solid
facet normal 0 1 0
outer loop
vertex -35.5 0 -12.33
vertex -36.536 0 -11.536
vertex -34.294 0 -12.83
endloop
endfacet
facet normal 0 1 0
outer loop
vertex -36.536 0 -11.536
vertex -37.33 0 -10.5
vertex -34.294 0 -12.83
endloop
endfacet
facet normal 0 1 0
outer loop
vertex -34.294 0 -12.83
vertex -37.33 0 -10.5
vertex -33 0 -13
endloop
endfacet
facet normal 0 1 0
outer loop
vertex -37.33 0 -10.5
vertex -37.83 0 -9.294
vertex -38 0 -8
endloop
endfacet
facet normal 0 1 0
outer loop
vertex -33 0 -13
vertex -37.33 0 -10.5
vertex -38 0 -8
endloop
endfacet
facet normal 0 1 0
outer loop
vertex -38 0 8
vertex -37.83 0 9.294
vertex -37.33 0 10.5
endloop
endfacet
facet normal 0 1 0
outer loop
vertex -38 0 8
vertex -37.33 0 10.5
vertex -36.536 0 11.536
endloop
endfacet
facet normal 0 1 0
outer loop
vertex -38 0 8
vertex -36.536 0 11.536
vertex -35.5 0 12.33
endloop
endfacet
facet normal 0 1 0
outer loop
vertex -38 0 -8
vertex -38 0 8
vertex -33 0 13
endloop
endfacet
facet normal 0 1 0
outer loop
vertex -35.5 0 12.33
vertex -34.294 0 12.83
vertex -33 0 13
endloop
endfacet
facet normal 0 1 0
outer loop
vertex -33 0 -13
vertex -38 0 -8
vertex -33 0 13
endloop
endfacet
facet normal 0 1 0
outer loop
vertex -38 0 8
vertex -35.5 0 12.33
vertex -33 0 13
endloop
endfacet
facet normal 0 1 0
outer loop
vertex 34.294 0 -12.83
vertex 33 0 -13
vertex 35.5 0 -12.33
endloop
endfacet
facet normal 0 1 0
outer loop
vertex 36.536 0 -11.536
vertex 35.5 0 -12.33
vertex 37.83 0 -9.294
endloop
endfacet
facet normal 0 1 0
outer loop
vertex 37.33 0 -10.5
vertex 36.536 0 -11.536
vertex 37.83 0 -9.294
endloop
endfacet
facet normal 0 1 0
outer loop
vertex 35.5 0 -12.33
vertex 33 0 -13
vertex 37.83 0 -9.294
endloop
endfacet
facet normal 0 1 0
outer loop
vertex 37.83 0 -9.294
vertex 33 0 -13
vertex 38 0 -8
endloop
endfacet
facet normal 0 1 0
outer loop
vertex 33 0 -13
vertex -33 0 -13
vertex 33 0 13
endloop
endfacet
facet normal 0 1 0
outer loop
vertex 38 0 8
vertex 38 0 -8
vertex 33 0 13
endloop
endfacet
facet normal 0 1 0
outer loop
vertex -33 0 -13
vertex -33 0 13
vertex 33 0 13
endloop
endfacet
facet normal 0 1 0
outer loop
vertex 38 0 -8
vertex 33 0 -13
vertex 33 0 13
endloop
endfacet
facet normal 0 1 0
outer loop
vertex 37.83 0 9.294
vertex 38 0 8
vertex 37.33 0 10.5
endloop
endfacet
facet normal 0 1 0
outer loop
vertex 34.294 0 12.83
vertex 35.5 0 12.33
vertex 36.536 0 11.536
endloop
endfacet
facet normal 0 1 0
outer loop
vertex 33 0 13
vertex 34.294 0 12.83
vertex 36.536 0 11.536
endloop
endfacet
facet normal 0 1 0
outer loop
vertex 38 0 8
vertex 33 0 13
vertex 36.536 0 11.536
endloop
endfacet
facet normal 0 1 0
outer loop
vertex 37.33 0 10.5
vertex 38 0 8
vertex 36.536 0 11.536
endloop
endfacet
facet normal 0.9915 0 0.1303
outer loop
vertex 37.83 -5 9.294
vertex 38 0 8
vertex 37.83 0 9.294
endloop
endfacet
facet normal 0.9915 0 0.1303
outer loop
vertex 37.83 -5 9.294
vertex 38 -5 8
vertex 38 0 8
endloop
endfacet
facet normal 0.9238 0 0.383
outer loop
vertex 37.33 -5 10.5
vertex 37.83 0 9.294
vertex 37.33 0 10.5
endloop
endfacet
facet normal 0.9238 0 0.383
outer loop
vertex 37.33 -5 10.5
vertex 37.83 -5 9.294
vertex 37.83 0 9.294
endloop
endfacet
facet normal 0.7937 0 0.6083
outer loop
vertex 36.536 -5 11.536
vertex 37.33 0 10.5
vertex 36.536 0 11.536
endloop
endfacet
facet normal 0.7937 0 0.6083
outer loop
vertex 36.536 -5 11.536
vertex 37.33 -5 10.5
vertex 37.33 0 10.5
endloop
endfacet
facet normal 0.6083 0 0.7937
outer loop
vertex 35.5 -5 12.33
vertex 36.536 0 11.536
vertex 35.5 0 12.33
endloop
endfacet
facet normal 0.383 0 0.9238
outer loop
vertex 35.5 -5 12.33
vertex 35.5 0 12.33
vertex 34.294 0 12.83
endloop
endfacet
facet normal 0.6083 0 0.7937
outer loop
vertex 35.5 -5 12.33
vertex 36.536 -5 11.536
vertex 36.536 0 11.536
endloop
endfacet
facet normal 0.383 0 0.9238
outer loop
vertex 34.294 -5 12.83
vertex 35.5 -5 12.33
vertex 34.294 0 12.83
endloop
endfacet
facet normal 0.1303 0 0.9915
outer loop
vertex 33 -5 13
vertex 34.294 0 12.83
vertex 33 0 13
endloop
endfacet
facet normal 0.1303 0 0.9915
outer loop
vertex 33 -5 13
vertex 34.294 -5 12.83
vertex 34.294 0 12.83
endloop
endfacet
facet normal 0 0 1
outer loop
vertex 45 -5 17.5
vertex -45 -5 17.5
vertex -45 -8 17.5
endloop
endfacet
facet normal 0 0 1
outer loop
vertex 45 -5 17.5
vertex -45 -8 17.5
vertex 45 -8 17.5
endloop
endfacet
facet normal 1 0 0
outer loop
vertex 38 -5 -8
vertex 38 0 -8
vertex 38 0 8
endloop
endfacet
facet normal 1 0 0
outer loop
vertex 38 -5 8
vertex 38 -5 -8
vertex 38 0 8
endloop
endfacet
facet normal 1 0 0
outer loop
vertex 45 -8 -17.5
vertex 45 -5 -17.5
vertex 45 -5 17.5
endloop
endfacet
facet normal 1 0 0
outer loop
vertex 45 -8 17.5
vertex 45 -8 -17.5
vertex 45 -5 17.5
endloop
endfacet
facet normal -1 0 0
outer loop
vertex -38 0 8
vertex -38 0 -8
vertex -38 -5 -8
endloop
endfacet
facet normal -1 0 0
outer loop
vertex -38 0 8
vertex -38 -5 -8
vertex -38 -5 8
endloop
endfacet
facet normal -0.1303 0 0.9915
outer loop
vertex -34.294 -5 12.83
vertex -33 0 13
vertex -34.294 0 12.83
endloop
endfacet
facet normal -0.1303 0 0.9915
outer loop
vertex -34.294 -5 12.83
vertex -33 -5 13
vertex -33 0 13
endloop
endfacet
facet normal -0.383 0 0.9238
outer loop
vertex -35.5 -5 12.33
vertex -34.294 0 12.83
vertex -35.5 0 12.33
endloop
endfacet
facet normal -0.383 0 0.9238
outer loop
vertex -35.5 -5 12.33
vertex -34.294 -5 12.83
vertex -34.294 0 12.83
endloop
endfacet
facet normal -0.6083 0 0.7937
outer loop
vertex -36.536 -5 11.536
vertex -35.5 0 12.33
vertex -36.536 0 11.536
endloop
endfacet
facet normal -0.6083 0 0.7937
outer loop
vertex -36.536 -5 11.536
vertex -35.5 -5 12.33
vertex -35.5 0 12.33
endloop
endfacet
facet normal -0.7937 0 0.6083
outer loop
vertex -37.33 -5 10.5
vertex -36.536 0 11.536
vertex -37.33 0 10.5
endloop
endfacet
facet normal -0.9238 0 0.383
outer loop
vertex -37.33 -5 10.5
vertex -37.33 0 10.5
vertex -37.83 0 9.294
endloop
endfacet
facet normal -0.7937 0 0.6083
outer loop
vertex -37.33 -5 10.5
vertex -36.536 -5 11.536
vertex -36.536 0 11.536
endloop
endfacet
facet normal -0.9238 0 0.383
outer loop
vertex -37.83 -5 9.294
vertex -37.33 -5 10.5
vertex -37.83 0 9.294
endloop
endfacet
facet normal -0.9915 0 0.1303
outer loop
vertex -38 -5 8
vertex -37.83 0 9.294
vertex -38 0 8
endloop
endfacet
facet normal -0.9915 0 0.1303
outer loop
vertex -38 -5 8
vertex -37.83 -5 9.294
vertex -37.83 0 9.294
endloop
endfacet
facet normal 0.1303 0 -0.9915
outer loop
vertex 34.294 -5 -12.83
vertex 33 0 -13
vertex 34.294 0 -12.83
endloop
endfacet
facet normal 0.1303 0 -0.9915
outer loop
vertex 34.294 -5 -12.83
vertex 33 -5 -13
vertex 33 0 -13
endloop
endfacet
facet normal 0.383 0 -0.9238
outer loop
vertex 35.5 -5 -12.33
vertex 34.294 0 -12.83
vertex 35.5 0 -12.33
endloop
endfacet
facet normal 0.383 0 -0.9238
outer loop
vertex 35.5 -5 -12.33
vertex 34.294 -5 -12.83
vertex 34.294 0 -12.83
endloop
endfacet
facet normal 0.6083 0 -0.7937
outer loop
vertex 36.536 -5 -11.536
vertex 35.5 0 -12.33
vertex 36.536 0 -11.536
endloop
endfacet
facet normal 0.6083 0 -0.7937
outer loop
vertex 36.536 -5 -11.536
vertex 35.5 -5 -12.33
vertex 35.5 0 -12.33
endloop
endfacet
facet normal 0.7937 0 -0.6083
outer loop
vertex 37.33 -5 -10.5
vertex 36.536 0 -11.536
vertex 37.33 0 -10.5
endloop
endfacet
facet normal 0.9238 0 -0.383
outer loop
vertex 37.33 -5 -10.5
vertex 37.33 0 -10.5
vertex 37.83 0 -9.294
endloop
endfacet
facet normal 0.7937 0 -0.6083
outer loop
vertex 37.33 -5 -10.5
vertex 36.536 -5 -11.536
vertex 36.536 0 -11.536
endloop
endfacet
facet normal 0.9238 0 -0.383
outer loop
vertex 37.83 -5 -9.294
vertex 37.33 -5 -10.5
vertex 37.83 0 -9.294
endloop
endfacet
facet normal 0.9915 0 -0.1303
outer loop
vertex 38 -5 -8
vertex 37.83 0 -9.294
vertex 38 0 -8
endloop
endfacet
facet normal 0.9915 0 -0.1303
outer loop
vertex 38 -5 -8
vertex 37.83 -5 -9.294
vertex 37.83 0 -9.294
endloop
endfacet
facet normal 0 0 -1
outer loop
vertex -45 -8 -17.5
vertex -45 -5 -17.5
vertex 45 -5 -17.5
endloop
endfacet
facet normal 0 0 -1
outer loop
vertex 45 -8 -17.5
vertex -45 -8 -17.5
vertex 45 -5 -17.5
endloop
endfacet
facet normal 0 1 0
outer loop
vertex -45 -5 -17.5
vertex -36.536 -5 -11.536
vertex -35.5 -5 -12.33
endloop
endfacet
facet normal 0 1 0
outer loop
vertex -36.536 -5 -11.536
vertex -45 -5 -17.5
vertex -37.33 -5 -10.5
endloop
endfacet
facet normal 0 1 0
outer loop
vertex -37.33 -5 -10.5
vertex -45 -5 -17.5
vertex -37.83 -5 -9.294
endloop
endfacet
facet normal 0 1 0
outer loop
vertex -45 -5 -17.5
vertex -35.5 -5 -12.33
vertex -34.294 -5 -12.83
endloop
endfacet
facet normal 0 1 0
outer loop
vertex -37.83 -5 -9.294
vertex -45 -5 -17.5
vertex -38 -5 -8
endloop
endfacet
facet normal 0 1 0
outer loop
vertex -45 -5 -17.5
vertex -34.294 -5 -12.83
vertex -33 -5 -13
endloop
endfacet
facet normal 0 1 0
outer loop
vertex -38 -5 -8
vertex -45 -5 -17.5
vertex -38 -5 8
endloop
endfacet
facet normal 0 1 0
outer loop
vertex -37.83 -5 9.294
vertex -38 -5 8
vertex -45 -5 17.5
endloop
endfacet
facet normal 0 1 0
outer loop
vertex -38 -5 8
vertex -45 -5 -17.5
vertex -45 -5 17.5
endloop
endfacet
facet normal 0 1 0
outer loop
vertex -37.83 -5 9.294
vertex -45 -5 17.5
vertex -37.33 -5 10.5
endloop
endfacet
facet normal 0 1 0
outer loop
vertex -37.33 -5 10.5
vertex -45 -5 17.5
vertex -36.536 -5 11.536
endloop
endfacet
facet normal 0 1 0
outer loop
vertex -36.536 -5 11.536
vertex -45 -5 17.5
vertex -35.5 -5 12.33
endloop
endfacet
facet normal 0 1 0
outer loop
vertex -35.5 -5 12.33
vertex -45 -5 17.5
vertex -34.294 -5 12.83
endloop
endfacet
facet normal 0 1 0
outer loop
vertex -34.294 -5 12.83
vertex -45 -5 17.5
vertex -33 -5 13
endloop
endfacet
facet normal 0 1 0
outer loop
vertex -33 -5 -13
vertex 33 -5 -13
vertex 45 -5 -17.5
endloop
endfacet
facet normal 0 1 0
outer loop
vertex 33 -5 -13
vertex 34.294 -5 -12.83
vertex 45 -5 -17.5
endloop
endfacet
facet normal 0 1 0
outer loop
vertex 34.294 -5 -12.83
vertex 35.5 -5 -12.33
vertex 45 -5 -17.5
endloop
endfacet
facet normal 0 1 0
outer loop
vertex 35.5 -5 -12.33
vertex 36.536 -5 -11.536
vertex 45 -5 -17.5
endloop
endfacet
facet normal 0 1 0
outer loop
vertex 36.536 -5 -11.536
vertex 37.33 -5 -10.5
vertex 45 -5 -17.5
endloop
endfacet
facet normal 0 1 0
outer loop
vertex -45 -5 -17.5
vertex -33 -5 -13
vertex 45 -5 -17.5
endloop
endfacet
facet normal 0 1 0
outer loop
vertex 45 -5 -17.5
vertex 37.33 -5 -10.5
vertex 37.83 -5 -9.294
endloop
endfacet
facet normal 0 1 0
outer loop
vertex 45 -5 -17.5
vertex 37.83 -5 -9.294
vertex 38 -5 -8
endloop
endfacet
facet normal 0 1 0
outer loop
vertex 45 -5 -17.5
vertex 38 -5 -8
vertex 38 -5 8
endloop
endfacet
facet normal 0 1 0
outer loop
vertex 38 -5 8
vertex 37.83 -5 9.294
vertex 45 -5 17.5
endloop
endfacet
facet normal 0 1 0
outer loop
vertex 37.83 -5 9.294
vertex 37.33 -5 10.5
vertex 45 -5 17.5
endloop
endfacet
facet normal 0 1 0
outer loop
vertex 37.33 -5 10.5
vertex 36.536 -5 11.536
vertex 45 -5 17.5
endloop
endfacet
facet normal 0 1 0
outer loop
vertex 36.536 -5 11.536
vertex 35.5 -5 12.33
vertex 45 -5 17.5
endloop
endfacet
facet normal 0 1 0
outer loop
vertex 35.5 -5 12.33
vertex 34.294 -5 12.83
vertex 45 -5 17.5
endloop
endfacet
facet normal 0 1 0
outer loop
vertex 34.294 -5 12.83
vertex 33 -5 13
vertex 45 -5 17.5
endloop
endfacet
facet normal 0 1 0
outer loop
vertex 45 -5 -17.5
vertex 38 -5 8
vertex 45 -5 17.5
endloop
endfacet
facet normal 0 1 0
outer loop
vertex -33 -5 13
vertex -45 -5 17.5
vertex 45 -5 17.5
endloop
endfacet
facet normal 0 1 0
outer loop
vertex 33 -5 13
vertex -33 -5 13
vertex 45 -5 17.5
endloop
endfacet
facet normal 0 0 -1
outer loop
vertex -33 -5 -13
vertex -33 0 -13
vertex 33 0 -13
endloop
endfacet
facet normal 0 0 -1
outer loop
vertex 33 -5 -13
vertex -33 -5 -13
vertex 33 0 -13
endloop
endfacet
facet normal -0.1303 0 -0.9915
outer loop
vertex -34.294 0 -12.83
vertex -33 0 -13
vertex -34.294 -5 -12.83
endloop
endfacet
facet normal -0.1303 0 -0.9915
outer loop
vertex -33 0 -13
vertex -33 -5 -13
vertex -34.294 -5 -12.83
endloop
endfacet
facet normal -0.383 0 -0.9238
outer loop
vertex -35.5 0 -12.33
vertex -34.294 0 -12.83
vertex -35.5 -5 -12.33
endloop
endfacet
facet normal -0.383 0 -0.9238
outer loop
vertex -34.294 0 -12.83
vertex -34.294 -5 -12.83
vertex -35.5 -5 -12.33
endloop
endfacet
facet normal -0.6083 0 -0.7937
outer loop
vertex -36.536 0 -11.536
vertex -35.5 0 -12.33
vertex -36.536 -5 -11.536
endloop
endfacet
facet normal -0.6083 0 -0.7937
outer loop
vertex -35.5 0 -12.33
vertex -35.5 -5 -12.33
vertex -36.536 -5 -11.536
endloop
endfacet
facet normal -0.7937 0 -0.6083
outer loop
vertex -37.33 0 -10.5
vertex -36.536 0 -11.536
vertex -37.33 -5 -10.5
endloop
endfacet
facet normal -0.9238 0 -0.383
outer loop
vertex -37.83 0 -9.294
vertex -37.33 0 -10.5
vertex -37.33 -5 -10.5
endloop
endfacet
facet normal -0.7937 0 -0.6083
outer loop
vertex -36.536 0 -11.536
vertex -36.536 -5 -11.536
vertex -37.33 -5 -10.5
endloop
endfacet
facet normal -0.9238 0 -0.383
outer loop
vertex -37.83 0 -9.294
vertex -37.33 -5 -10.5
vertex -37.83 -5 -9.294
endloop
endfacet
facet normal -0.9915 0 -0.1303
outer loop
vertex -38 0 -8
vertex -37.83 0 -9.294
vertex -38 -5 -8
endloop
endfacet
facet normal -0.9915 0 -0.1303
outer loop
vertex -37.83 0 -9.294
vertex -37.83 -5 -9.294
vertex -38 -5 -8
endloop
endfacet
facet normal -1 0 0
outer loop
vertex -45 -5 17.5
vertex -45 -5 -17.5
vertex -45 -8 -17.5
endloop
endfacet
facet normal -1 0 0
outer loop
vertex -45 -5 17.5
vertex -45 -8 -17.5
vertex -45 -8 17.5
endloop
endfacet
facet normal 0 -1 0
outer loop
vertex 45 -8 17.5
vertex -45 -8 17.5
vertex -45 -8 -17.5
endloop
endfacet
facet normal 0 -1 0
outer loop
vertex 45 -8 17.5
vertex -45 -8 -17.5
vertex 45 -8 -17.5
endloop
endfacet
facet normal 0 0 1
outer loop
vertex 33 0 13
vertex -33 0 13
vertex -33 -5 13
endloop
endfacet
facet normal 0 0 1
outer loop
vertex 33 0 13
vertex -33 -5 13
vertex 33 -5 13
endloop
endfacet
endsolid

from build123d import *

# Parameters (mm, degrees)
F0_W     = 76
F0_H     = 26
F1_DEPTH = 5
F2_W     = 90
F2_H     = 35
F3_DEPTH = 3
F4_R     = 5


with BuildPart() as f1:
    # F0 (on Front) → F1 (new body)
    with BuildSketch(Plane.XZ):
        Rectangle(F0_W, F0_H)
    extrude(amount=F1_DEPTH)

    # F2 (on face) → F3 (join)
    with BuildSketch(Plane.XZ.offset(5)):
        Rectangle(F2_W, F2_H)
    extrude(amount=F3_DEPTH)

    # F4
    f4_edges = [f1.edges().sort_by_distance(p)[0] for p in [
        (-38, -2.5, 13),
        (38, -2.5, 13),
        (38, -2.5, -13),
        (-38, -2.5, -13),
    ]]
    fillet(f4_edges, radius=F4_R)


solid = f1.part
